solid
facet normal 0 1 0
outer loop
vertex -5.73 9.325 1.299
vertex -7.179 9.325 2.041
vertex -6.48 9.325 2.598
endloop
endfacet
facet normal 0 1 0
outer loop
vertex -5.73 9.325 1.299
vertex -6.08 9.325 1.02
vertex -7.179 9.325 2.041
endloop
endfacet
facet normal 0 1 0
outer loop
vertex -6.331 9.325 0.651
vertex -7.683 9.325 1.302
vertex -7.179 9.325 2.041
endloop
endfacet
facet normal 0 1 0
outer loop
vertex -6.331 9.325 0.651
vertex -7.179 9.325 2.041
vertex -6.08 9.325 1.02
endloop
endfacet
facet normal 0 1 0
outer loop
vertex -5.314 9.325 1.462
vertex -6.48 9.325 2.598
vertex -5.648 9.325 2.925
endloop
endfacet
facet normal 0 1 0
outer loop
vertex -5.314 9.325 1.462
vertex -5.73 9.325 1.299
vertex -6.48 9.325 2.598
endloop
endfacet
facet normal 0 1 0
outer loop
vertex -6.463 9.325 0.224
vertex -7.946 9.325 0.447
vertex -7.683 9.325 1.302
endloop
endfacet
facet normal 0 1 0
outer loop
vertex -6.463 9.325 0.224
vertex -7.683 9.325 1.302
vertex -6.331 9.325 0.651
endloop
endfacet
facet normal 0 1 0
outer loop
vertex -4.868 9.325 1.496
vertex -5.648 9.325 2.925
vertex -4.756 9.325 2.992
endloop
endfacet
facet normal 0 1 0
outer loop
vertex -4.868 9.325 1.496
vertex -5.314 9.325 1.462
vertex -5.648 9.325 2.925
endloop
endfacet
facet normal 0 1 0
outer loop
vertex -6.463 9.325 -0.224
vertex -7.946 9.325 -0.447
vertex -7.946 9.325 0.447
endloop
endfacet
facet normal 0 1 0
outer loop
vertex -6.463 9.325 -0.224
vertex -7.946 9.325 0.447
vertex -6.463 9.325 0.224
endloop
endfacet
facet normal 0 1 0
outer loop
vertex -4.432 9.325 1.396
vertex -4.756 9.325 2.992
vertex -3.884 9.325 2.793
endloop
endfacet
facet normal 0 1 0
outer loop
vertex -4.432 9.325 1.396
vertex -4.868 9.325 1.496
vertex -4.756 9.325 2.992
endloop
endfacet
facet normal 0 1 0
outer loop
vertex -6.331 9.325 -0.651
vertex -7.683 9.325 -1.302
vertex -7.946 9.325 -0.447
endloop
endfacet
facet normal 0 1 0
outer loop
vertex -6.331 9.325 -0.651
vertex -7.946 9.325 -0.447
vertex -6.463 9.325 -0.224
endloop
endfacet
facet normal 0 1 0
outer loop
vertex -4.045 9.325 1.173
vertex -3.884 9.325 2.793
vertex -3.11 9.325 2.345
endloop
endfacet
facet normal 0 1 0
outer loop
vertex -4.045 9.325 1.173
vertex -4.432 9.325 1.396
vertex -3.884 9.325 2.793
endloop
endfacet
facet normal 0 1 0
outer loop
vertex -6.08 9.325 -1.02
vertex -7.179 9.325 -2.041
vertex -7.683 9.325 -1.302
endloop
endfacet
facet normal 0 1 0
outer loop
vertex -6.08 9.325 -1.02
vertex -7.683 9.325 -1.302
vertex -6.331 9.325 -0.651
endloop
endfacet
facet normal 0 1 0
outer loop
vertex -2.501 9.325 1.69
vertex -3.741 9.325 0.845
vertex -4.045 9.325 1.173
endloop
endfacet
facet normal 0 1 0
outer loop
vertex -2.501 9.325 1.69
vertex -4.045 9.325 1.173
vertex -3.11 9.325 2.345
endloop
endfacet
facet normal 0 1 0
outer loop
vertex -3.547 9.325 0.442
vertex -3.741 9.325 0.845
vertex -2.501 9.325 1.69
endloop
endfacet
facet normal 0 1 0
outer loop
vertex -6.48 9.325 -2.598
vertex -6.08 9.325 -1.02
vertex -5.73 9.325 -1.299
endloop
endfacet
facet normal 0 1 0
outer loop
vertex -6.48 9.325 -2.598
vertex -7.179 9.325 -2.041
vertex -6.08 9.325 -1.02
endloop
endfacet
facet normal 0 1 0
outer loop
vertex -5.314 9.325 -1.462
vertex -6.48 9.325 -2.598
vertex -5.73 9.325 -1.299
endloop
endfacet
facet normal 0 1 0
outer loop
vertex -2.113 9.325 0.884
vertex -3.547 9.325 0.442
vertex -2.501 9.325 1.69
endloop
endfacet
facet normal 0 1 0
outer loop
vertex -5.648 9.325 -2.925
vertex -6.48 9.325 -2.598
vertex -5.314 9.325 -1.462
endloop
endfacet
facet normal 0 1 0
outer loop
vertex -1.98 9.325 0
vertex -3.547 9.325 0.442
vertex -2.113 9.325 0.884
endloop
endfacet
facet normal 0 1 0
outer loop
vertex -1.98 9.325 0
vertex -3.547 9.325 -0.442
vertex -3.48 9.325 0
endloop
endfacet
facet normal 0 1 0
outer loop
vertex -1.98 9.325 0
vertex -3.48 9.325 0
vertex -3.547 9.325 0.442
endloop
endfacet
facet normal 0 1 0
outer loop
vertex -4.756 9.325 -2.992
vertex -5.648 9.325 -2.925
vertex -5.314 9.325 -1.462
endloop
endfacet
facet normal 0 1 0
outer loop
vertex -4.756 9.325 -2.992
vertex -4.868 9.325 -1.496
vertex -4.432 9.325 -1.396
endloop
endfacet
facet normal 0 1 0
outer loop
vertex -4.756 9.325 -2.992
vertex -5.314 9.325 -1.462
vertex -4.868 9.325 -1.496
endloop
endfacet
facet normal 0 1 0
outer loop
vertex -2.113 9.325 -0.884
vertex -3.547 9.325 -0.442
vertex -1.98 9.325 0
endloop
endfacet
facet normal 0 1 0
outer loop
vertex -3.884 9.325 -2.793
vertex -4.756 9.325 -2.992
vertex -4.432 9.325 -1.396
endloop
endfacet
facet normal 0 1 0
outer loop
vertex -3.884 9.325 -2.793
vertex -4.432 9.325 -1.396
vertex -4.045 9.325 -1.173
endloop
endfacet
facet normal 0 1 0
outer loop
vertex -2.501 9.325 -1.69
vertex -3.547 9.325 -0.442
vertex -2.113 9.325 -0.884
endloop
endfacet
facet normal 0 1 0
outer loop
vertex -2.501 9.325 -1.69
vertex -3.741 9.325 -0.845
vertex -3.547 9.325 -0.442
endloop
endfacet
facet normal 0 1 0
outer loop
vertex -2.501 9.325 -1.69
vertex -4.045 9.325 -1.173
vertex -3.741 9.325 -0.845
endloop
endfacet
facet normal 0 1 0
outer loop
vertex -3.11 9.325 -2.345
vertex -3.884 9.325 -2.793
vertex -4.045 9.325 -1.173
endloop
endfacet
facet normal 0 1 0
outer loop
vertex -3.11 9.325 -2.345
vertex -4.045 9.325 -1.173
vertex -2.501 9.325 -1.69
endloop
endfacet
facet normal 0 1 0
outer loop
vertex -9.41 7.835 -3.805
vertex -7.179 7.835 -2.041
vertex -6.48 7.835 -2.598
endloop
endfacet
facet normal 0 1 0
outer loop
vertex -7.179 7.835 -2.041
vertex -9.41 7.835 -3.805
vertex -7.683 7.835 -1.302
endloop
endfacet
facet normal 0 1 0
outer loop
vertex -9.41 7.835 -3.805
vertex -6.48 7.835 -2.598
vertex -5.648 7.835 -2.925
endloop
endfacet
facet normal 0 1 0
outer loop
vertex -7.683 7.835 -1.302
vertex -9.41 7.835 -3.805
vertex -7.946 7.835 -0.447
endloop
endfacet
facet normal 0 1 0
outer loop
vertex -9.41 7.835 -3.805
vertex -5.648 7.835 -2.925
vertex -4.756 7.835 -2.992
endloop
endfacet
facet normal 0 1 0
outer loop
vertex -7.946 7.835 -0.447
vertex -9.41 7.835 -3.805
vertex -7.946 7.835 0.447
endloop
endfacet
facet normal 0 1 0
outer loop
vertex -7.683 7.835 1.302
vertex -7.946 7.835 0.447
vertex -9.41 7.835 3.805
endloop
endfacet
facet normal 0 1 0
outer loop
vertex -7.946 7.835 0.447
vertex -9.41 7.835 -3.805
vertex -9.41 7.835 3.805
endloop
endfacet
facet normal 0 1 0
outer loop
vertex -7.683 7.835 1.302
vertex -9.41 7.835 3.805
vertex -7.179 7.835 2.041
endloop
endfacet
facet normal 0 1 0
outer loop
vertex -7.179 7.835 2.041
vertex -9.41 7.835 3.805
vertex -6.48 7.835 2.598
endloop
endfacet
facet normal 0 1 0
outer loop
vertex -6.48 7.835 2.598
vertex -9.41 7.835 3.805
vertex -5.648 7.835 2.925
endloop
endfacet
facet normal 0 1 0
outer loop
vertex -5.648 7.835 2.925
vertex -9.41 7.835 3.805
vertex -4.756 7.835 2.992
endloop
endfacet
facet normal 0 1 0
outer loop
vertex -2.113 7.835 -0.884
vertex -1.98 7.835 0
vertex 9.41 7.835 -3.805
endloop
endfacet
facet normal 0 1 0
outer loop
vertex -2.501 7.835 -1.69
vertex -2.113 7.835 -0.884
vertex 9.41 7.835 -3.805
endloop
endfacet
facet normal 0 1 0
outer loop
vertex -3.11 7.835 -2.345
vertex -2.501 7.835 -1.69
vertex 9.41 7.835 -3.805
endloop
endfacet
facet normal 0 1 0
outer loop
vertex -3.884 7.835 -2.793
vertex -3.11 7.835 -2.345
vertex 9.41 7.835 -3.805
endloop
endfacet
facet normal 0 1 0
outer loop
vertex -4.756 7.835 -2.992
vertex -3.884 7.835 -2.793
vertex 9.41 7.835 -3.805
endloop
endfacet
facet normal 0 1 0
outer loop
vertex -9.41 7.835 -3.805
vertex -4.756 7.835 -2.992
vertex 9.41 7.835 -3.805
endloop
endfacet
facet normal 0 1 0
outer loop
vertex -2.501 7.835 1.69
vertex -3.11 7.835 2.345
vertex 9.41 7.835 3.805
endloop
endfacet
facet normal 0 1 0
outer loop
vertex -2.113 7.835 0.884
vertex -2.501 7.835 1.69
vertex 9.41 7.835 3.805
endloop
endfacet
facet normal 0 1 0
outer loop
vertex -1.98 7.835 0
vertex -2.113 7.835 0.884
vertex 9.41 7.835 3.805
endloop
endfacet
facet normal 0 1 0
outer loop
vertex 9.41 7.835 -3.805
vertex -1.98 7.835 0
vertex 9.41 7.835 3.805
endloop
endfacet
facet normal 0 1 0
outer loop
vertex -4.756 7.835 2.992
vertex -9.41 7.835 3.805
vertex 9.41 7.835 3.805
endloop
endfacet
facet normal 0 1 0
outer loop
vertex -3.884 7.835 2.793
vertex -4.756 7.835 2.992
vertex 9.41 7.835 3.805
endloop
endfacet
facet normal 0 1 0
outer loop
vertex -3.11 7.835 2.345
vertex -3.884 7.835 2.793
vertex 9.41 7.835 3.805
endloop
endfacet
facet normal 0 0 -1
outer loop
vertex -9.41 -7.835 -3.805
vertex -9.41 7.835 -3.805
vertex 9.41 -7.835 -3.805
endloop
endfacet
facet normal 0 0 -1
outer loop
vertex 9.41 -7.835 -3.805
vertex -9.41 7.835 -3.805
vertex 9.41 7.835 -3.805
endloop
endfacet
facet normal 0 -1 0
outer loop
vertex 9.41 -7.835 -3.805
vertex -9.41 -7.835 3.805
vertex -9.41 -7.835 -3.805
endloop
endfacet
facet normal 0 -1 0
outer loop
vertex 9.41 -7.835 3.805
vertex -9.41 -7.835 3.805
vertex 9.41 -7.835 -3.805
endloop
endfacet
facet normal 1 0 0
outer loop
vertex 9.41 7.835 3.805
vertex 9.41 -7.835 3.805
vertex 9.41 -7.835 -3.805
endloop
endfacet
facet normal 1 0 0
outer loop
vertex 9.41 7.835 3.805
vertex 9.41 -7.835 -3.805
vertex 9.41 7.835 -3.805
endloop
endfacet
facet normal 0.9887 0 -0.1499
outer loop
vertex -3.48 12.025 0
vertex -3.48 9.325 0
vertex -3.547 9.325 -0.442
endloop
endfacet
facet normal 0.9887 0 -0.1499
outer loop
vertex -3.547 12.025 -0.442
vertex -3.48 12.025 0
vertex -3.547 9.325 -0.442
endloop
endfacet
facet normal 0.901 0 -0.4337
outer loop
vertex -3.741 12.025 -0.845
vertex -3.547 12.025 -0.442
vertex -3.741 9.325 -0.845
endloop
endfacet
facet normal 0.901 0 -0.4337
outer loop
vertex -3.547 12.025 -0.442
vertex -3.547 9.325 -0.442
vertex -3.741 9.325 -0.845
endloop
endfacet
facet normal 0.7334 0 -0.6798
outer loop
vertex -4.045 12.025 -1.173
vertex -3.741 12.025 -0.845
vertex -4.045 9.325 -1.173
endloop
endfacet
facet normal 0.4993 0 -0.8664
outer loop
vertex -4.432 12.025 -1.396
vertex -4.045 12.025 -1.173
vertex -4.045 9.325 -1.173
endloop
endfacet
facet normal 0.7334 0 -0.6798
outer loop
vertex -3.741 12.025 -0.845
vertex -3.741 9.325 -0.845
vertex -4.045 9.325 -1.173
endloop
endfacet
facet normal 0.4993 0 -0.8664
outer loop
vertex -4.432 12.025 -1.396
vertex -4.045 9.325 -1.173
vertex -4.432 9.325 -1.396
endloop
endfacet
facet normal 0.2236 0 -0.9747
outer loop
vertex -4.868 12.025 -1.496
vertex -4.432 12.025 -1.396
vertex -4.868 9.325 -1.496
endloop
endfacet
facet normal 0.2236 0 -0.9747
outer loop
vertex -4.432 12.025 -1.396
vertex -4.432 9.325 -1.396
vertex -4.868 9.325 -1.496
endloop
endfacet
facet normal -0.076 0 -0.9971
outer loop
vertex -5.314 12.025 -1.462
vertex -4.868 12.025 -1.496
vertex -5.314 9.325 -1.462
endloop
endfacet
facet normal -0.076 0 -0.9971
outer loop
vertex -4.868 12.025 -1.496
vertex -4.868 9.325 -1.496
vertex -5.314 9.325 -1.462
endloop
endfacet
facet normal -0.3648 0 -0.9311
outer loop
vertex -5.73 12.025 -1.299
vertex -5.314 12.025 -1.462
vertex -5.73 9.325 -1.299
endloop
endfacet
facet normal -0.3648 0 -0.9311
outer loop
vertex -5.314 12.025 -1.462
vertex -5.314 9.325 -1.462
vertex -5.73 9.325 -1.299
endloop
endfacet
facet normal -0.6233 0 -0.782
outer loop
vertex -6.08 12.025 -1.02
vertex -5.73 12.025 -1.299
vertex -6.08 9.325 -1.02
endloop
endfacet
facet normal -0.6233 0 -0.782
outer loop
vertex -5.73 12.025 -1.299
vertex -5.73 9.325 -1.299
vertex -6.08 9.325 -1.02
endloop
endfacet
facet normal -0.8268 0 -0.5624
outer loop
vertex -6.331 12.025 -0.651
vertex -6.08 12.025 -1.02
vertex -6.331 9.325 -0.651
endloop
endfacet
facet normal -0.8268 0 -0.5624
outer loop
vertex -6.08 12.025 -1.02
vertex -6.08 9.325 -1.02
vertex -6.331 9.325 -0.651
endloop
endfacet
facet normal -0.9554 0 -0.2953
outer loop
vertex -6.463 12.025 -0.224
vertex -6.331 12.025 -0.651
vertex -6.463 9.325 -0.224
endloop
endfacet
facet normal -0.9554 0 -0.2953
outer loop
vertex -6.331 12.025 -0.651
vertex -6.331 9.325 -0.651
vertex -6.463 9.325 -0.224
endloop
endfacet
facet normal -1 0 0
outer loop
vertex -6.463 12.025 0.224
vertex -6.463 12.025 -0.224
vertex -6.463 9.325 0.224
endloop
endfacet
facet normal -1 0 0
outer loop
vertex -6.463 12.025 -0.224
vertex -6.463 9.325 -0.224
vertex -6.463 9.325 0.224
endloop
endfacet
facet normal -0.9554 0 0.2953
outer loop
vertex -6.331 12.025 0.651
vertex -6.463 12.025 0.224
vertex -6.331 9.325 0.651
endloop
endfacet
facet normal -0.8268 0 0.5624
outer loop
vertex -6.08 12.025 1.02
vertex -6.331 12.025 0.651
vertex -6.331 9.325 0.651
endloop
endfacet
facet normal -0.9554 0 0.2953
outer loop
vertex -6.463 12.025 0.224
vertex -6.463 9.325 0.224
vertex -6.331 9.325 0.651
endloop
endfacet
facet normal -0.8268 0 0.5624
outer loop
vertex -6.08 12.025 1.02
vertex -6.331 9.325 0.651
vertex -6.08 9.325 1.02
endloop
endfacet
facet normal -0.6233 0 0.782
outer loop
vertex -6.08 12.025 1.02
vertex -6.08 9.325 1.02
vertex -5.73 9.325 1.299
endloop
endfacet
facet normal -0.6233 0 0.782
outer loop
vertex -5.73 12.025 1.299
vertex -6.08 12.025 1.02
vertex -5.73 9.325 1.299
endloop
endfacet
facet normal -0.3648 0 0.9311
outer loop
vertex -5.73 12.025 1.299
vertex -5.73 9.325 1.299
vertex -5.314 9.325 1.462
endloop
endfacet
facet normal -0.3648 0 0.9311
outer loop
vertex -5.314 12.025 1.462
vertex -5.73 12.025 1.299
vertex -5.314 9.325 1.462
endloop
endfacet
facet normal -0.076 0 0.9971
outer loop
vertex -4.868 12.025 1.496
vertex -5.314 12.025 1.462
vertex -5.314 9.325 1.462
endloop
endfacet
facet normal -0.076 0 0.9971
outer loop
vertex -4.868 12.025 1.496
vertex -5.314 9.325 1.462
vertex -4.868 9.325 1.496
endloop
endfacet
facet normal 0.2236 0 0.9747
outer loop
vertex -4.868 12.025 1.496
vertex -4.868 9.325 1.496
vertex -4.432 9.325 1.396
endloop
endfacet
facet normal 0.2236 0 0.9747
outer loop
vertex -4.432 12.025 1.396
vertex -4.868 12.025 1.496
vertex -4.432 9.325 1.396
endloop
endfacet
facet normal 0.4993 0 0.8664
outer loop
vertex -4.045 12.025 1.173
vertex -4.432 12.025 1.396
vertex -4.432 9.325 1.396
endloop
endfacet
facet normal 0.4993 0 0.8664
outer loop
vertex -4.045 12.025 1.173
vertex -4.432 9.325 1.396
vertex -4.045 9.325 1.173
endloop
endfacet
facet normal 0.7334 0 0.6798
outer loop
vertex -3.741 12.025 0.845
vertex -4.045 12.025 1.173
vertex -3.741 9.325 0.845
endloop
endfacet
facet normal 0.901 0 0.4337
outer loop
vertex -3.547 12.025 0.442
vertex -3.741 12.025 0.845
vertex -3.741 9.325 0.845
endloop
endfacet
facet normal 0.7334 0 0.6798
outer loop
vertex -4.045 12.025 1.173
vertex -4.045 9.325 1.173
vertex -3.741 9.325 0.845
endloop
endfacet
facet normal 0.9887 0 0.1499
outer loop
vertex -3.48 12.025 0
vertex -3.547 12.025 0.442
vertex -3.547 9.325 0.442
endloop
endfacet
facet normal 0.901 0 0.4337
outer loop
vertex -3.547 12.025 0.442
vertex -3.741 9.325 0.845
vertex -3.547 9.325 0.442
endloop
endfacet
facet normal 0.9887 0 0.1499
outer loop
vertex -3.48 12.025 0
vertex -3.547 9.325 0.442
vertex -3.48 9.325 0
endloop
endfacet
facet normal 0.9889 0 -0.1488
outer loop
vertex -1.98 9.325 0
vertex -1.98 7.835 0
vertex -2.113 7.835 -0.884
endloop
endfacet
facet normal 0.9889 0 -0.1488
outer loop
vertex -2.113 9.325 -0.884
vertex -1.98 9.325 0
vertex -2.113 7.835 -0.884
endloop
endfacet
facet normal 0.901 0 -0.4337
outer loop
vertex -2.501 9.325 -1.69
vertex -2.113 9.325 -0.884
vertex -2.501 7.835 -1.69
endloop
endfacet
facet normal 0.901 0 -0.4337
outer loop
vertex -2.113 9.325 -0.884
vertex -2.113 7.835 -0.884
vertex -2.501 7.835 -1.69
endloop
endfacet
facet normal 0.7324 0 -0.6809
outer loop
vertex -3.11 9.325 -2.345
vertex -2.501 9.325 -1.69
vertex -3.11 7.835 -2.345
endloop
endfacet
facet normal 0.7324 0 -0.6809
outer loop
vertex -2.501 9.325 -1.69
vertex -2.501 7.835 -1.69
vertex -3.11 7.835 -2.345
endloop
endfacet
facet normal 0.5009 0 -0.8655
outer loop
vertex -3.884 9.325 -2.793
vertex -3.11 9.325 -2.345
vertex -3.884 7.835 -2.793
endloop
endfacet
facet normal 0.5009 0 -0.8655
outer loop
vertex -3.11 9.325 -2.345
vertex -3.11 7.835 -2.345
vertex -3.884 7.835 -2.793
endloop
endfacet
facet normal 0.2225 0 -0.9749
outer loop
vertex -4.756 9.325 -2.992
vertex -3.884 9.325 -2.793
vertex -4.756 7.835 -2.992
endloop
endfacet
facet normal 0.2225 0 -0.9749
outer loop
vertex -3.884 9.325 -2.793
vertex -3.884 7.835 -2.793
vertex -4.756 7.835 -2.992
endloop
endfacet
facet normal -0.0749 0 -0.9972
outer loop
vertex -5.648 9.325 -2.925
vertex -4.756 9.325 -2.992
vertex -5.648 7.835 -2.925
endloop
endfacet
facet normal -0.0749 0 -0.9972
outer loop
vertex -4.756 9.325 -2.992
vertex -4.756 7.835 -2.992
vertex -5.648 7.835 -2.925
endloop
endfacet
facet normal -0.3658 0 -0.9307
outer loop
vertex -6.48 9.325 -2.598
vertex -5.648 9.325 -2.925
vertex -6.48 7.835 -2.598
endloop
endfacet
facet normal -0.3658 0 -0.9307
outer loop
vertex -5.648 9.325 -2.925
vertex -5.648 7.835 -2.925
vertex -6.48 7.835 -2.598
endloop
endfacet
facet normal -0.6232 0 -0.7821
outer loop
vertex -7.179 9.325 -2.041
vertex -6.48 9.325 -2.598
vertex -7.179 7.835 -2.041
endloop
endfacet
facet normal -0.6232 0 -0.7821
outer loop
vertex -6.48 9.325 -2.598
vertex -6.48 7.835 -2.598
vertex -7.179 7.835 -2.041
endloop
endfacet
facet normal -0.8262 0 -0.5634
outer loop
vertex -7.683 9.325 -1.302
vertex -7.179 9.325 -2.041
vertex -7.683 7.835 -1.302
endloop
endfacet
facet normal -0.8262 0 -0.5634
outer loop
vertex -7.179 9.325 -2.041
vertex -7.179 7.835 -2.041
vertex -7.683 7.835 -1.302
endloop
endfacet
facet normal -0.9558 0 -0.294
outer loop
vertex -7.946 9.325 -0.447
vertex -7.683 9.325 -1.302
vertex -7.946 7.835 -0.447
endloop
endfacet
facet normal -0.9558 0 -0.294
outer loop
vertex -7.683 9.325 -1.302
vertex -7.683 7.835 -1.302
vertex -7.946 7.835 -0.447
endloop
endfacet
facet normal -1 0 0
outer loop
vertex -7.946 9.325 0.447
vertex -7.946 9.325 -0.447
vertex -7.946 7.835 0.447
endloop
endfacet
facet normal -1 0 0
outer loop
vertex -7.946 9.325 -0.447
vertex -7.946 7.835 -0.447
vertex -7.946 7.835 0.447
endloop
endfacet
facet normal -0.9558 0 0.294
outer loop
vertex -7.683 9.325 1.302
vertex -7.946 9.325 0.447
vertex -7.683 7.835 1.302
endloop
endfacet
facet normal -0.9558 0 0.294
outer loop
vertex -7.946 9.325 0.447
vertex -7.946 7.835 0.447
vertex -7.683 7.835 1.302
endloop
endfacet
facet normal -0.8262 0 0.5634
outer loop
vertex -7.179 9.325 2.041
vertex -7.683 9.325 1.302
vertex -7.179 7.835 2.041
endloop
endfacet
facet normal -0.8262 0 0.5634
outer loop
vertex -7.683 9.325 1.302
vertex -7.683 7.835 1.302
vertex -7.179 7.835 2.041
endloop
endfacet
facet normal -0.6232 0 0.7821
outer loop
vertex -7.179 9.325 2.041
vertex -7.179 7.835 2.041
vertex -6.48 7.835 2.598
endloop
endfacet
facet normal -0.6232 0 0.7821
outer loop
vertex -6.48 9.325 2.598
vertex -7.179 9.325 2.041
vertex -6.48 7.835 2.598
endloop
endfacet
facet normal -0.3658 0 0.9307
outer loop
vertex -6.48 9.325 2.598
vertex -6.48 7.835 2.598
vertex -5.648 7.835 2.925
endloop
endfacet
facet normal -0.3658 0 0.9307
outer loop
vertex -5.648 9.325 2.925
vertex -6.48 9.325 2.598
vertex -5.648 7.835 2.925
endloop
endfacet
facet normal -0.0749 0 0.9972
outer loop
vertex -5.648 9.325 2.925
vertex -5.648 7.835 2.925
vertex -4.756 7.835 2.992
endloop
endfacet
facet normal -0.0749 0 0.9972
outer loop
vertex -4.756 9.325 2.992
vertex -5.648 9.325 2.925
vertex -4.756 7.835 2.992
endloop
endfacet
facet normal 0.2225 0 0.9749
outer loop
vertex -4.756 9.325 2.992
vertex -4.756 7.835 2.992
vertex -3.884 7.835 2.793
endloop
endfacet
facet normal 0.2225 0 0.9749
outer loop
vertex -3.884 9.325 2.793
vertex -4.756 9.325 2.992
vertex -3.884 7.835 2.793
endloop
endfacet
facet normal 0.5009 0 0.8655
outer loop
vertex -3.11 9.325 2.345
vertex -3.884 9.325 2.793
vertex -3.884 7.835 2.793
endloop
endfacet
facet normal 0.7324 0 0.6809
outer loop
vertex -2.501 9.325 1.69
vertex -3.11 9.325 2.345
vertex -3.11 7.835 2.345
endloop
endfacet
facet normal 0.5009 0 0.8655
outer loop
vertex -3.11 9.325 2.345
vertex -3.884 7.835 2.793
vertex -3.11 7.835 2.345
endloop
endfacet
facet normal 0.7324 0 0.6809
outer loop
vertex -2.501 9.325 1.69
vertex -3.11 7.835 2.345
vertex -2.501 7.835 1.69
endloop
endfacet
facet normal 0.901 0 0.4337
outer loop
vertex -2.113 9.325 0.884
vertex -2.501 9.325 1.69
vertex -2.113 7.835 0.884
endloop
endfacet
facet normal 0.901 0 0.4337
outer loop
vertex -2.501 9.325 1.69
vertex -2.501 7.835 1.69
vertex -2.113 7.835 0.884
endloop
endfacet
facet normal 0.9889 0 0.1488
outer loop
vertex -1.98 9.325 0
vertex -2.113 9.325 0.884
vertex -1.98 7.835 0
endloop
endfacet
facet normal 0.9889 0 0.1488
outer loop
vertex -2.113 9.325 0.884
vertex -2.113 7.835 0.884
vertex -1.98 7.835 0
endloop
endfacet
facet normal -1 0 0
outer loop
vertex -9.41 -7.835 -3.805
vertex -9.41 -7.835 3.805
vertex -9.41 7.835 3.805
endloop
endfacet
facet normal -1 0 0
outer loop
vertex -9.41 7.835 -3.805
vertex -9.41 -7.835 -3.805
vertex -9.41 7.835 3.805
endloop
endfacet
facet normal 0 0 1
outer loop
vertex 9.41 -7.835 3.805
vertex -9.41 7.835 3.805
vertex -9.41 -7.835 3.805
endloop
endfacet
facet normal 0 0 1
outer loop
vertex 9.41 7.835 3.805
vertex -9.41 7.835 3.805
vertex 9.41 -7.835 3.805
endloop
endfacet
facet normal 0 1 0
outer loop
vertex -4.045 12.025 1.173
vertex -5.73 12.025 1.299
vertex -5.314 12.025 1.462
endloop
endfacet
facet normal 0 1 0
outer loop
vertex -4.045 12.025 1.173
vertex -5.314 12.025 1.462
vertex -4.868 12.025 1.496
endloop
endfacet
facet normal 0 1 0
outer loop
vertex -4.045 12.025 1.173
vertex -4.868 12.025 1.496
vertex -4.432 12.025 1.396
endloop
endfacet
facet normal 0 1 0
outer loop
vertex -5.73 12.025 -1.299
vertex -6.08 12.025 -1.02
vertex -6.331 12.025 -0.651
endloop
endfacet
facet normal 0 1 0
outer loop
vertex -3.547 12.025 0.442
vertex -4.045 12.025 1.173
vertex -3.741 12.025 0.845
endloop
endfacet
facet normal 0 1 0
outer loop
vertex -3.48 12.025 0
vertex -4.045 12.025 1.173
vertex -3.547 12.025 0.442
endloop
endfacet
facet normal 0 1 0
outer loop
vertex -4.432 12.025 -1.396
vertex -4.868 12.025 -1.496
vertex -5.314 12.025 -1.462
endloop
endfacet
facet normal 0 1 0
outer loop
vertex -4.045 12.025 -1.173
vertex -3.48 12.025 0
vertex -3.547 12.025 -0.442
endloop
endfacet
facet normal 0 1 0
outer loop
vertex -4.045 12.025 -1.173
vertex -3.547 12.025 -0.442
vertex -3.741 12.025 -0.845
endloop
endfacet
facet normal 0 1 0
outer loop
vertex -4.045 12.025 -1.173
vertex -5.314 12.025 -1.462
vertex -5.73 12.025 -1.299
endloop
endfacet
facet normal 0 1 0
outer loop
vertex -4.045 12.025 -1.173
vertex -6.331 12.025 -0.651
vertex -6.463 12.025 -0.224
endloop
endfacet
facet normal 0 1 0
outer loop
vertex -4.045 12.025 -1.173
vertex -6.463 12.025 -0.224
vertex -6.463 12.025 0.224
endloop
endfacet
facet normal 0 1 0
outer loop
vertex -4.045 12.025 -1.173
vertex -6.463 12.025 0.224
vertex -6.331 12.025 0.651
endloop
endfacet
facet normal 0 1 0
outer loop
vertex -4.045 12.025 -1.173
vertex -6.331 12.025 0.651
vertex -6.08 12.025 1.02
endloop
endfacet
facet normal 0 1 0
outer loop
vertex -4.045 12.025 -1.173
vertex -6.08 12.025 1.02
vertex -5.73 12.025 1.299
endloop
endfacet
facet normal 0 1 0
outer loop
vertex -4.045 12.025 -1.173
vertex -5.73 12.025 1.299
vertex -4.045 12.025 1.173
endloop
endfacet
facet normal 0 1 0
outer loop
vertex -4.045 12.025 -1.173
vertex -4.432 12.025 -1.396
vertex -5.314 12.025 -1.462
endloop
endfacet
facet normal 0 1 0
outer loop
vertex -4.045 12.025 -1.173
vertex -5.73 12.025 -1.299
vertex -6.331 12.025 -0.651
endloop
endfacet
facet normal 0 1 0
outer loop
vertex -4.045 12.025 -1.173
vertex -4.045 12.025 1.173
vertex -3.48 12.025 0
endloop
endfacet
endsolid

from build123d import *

# Parameters (mm, degrees)
SKETCH2_W           = 18.82
SKETCH2_H           = 15.67
BOSS_EXTRUDE1_DEPTH = 3.805
SKETCH3_R           = 3
BOSS_EXTRUDE2_DEPTH = 1.49
SKETCH4_R           = 1.5
BOSS_EXTRUDE3_DEPTH = 2.7


with BuildPart() as part:
    # Sketch2 → Boss-Extrude1 (new, symmetric)
    with BuildSketch(Plane.XY):
        Rectangle(SKETCH2_W, SKETCH2_H)
    extrude(amount=BOSS_EXTRUDE1_DEPTH, both=True)

    # Sketch3 → Boss-Extrude2 (add)
    with BuildSketch(Plane(origin=(0, 7.835, 0), x_dir=(1, 0, 0), z_dir=(0, 1, 0))):
        with Locations((-4.98, 0)):
            Circle(SKETCH3_R)
    extrude(amount=BOSS_EXTRUDE2_DEPTH)

    # Sketch4 → Boss-Extrude3 (add)
    with BuildSketch(Plane(origin=(0, 9.325, 0), x_dir=(1, 0, 0), z_dir=(0, 1, 0))):
        with Locations((-4.98, 0)):
            Circle(SKETCH4_R)
    extrude(amount=BOSS_EXTRUDE3_DEPTH)


solid = part.part
